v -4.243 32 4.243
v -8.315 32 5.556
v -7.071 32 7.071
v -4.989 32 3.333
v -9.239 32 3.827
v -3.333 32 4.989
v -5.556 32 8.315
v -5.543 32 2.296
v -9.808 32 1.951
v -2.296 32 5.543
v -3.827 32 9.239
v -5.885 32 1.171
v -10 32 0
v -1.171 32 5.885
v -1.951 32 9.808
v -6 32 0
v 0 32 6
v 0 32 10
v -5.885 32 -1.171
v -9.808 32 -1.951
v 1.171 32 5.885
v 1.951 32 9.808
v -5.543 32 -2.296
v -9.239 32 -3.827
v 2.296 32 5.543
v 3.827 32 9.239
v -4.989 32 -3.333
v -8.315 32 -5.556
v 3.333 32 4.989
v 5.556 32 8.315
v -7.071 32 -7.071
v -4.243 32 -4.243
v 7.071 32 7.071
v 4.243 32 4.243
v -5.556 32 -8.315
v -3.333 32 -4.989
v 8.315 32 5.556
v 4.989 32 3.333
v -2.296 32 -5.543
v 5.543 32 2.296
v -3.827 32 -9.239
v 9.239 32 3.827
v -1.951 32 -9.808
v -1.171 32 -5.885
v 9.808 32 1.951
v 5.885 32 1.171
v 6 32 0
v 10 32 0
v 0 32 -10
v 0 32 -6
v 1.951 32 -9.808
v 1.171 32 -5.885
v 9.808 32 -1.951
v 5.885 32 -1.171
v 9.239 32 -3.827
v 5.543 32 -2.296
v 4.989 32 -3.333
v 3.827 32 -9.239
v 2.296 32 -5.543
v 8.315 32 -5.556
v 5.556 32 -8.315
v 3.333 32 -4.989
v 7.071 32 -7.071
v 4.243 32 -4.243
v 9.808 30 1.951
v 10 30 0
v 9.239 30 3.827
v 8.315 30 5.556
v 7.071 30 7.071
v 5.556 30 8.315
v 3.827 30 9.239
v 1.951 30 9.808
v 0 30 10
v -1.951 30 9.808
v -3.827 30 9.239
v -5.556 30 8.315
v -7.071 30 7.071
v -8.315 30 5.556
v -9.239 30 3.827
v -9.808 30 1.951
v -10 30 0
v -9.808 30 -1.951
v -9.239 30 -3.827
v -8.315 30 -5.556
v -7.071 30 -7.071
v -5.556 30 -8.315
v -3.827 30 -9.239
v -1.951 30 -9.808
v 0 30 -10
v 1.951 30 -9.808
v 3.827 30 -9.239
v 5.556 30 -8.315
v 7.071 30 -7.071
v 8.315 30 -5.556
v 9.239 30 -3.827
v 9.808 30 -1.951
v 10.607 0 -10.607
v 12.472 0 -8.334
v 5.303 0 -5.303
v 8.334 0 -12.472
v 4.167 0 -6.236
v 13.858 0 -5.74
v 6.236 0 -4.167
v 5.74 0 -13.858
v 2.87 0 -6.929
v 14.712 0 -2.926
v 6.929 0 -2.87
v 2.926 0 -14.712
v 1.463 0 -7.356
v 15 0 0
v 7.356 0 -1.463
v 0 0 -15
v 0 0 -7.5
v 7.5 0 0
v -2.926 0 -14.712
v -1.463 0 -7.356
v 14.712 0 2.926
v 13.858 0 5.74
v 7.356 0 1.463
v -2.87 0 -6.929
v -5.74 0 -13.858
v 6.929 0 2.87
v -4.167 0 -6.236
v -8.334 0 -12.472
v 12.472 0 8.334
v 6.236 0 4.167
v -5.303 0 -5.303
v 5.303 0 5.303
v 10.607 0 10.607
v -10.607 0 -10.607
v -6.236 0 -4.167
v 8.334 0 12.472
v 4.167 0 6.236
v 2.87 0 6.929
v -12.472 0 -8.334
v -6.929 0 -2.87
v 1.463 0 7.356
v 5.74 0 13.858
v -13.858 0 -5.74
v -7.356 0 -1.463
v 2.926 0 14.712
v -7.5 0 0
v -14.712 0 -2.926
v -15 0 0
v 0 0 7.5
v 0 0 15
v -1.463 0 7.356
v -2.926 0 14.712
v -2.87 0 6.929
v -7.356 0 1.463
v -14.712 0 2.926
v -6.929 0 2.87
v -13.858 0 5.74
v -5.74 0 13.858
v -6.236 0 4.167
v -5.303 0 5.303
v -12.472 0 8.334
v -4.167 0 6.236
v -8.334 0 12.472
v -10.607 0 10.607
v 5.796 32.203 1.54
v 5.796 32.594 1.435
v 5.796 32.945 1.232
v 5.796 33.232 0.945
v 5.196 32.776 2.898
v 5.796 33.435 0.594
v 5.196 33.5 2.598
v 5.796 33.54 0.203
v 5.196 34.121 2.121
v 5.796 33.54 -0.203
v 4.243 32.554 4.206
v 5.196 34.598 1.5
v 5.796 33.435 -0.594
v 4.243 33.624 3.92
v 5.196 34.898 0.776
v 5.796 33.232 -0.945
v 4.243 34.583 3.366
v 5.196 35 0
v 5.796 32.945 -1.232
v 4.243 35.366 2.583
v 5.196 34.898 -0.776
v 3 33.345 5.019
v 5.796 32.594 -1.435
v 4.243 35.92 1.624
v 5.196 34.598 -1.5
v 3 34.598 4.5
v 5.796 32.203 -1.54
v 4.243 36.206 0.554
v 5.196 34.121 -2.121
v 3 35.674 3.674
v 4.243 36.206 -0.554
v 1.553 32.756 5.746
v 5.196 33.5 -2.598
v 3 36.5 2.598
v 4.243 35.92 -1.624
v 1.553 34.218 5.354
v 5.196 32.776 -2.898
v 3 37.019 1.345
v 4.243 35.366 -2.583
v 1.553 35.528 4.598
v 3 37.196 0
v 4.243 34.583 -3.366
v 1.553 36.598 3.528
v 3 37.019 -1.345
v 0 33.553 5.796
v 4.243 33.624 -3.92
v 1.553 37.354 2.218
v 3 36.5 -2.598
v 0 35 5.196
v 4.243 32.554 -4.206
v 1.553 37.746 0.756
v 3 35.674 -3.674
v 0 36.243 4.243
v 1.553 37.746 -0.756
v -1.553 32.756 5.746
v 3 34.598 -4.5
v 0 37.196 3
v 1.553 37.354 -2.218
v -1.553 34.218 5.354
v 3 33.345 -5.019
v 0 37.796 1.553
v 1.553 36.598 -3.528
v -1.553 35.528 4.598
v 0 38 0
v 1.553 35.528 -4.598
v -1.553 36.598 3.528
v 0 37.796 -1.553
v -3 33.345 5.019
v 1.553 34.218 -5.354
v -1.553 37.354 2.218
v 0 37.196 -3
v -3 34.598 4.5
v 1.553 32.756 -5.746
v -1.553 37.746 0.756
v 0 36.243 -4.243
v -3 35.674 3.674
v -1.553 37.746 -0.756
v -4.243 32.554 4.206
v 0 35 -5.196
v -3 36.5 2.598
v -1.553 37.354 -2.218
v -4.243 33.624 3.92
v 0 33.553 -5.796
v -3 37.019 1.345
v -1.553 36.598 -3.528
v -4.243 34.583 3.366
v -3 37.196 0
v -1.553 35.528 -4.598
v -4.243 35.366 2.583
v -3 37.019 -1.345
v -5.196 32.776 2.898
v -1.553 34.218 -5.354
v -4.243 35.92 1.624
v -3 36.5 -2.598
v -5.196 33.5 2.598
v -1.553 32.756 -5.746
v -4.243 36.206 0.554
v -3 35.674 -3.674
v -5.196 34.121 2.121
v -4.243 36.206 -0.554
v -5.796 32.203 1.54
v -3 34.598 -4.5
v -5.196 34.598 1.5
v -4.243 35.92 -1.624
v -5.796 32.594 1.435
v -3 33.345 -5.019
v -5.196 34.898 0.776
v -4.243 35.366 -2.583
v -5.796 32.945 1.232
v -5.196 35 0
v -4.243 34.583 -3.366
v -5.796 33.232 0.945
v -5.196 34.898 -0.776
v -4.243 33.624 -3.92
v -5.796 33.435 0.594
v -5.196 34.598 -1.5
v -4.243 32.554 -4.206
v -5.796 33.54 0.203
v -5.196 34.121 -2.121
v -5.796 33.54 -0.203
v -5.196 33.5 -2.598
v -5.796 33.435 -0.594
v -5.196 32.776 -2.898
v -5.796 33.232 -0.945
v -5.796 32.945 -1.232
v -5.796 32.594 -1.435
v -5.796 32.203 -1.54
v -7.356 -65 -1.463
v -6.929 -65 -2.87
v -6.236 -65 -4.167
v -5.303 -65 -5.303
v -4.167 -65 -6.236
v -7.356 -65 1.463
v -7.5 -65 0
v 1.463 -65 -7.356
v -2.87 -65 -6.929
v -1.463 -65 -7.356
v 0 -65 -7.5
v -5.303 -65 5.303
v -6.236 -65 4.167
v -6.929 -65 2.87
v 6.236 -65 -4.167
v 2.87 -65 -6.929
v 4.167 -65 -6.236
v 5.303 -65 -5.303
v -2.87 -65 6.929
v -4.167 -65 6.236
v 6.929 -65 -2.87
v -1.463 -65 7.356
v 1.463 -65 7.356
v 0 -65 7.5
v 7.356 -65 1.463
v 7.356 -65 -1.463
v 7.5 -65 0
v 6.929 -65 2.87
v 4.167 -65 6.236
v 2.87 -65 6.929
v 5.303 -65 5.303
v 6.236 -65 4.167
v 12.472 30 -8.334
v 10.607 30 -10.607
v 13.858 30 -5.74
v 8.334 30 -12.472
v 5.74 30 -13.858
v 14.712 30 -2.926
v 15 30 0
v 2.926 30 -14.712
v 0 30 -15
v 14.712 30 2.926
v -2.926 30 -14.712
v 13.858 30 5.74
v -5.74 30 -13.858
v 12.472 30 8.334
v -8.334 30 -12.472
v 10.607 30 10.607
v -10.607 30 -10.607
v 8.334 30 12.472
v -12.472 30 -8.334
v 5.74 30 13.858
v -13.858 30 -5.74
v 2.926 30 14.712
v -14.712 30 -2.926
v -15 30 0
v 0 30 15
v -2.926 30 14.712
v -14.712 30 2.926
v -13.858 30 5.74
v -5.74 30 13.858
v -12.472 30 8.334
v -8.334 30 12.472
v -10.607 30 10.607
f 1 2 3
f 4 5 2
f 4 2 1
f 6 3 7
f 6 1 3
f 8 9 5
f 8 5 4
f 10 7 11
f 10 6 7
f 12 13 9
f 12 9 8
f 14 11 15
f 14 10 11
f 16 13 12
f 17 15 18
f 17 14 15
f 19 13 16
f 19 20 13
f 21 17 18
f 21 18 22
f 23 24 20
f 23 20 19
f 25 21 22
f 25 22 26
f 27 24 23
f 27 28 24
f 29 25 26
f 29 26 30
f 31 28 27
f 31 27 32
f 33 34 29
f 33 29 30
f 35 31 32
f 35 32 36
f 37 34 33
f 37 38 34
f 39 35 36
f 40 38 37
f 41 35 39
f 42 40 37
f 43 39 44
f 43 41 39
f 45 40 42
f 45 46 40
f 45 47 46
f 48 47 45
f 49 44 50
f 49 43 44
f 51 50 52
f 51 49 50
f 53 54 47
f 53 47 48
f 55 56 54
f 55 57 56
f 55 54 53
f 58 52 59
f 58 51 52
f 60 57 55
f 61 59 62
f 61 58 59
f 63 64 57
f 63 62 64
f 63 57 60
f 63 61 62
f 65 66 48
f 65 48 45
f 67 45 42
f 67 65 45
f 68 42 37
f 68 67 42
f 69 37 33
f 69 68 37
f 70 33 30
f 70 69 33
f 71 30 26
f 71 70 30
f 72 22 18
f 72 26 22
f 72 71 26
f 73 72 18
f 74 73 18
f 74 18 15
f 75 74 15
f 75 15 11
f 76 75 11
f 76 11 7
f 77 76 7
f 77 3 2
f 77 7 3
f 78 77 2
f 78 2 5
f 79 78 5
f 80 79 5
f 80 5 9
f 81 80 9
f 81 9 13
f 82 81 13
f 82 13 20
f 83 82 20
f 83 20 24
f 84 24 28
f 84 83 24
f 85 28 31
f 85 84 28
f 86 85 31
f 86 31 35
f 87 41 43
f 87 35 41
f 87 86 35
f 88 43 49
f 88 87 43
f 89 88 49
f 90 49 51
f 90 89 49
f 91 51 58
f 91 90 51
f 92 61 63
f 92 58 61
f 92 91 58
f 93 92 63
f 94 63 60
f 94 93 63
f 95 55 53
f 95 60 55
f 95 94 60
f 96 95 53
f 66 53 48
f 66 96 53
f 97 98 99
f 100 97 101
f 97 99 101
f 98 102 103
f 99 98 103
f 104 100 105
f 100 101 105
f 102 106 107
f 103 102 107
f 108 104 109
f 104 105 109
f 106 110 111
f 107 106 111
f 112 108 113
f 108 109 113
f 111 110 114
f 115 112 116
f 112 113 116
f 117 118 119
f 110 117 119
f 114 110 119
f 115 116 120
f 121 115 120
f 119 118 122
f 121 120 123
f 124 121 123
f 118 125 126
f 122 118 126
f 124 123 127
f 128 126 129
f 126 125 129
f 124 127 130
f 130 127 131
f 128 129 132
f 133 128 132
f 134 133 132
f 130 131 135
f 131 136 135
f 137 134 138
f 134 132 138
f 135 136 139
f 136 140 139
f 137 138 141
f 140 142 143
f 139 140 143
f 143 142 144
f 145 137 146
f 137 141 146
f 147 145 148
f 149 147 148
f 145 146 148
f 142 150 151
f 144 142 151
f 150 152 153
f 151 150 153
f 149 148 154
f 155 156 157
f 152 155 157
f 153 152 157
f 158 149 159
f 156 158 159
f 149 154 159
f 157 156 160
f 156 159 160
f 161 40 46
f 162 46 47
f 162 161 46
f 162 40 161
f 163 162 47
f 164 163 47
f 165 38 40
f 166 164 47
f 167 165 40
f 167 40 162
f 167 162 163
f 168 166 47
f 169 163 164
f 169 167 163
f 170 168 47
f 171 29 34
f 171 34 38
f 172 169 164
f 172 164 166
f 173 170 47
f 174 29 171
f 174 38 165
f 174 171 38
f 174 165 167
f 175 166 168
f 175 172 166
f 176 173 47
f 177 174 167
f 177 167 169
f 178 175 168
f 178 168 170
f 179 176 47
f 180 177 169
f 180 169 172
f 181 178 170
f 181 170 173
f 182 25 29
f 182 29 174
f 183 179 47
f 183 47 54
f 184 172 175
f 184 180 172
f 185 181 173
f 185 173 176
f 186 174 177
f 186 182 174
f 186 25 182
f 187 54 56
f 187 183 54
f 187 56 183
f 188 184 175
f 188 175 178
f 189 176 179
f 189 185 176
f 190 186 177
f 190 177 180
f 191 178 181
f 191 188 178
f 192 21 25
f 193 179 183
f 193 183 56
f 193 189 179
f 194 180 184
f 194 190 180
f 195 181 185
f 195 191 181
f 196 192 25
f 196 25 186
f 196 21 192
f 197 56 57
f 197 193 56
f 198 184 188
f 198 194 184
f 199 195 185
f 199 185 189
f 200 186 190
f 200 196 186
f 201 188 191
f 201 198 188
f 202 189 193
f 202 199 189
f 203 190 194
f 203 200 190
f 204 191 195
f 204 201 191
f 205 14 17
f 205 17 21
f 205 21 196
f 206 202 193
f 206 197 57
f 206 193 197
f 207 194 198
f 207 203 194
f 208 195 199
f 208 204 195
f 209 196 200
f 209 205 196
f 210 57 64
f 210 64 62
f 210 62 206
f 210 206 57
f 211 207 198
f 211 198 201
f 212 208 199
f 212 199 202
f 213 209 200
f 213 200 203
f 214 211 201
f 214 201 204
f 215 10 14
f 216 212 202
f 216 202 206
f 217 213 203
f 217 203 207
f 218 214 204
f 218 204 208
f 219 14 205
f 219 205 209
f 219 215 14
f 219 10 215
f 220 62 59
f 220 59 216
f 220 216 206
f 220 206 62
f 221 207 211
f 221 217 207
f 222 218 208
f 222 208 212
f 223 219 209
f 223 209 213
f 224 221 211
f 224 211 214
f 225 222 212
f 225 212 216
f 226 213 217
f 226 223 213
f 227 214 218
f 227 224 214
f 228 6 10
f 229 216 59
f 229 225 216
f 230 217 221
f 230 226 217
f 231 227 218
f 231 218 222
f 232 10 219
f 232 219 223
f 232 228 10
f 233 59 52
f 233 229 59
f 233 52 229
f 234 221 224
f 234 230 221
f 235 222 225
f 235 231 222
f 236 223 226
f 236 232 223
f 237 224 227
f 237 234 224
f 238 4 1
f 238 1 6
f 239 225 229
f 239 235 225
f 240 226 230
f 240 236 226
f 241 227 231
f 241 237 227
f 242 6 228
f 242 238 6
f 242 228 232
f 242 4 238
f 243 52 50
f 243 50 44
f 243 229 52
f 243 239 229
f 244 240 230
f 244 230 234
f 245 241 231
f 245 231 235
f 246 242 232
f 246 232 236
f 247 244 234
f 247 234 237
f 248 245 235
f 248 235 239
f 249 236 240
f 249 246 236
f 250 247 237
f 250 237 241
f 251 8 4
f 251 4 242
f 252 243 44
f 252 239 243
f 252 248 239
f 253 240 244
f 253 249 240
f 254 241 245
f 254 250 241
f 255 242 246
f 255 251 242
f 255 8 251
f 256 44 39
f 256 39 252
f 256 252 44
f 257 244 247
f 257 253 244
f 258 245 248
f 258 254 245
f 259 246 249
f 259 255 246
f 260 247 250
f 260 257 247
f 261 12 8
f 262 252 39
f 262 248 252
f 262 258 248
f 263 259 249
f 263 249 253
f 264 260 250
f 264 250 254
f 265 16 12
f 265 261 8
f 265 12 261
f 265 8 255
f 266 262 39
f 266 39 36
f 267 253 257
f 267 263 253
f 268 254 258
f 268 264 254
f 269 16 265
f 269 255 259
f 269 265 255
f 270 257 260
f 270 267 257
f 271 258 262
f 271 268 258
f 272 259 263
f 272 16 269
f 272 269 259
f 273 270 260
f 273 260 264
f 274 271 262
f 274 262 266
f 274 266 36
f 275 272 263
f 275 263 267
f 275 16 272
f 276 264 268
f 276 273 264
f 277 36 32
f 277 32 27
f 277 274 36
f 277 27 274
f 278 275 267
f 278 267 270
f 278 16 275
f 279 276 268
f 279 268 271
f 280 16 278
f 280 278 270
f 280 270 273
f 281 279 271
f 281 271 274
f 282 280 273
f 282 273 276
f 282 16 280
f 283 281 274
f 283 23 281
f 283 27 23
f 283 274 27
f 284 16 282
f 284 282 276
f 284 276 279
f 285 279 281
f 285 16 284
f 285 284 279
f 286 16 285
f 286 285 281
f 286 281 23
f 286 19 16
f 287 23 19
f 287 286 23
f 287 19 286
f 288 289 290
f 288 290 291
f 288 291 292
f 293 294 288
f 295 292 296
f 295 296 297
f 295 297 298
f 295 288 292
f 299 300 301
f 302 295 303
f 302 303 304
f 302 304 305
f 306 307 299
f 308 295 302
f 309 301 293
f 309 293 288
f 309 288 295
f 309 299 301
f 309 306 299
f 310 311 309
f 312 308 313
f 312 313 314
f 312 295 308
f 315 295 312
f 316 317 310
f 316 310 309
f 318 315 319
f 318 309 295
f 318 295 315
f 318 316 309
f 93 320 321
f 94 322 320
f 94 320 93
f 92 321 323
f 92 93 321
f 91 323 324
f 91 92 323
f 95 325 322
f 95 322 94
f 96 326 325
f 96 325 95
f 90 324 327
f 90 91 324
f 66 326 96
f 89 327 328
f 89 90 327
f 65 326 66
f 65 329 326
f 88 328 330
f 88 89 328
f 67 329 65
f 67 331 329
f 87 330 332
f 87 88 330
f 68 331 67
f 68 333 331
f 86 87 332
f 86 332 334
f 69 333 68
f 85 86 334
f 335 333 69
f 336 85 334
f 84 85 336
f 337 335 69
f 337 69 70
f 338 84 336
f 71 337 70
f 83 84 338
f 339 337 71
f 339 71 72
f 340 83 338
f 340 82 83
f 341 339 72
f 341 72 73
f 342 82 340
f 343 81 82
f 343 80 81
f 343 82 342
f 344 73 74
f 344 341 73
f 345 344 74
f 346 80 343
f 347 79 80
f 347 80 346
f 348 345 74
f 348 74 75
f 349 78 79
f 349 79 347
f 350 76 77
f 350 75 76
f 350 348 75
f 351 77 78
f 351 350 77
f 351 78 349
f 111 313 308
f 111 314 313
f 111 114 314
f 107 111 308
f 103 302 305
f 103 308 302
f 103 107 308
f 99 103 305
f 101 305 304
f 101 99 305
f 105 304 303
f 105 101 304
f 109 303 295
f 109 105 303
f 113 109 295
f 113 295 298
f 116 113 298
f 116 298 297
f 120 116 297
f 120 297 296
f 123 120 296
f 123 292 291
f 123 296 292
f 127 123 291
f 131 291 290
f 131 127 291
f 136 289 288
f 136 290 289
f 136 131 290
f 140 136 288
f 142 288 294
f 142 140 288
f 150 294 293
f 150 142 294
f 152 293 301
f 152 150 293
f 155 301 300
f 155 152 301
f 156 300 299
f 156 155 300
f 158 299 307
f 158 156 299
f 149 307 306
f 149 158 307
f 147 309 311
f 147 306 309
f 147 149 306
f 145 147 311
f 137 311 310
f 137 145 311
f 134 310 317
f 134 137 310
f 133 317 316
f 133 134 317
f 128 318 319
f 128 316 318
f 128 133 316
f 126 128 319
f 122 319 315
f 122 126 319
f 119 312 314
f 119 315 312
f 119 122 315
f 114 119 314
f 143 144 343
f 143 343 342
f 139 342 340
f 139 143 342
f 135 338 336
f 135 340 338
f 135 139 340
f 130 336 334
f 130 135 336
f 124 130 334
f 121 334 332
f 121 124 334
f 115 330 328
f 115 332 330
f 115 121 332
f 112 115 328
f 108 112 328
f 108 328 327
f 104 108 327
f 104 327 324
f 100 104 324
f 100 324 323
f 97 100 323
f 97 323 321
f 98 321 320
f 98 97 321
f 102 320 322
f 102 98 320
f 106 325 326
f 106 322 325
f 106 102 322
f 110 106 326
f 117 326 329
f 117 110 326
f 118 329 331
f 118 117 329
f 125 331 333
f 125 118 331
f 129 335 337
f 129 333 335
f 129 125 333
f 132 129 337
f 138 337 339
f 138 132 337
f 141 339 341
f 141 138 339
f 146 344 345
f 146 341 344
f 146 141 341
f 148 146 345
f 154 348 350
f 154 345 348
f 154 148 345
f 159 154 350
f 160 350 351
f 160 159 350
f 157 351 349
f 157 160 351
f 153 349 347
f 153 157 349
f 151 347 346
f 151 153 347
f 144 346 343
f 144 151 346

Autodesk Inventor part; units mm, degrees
ref_plane "YZ Plane" through (0, 0, 0) normal (1, 0, 0) x (0, 1, 0)
ref_plane "XZ Plane" through (0, 0, 0) normal (0, 1, 0) x (-1, 0, 0)
sketch "Boceto1" plane through (0, 0, 0) normal (0, 1, 0) x (-1, 0, 0)
  circle A0 centre (0, 0) radius 15
  dimension "d0" = 30
extrude "Extrusión1" add sketch "Boceto1" along normal blind 30
sketch "Boceto4" plane through (0, 30, 0) normal (0, 1, 0) x (1, 0, 0)
  circle A0 centre (0, 0) radius 10
  dimension "d7" = 20
extrude "Extrusión2" add sketch "Boceto4" along normal blind 2
sketch "Boceto5" plane through (0, 32, 0) normal (0, 1, 0) x (1, 0, 0)
  circle A0 centre (0, 0) radius 10 projected
  line L0 (-10, 0) -> (10, 0)
ref_plane "Plano de trabajo2" through (-10, 32, 0) normal (0, 0, 1) x (1, 0, 0)
sketch "Boceto6" plane through (-10, 32, 0) normal (0, 0, 1) x (1, 0, 0)
  line L0 (20, 0) -> (0, 0) projected
  circle A0 centre (10, 0) radius 6
  line L1 (4, 0) -> (16, 0)
  point P0 (10, -32)
  dimension "d11" = 12
revolve "Revolución2" add sketch "Boceto6" angle 360 about axis through (-6, 32, 0) along (1, 0, 0) picked at (11.497, 2.2835) contours L0 A0
sketch "Boceto7" plane through (0, 0, 0) normal (0, -1, 0) x (1, 0, 0)
  circle A0 centre (0, 0) radius 7.5
  dimension "d13" = 15
extrude "Extrusión3" add sketch "Boceto7" along normal blind 65
properties part number "Rodillo_Sostener"
